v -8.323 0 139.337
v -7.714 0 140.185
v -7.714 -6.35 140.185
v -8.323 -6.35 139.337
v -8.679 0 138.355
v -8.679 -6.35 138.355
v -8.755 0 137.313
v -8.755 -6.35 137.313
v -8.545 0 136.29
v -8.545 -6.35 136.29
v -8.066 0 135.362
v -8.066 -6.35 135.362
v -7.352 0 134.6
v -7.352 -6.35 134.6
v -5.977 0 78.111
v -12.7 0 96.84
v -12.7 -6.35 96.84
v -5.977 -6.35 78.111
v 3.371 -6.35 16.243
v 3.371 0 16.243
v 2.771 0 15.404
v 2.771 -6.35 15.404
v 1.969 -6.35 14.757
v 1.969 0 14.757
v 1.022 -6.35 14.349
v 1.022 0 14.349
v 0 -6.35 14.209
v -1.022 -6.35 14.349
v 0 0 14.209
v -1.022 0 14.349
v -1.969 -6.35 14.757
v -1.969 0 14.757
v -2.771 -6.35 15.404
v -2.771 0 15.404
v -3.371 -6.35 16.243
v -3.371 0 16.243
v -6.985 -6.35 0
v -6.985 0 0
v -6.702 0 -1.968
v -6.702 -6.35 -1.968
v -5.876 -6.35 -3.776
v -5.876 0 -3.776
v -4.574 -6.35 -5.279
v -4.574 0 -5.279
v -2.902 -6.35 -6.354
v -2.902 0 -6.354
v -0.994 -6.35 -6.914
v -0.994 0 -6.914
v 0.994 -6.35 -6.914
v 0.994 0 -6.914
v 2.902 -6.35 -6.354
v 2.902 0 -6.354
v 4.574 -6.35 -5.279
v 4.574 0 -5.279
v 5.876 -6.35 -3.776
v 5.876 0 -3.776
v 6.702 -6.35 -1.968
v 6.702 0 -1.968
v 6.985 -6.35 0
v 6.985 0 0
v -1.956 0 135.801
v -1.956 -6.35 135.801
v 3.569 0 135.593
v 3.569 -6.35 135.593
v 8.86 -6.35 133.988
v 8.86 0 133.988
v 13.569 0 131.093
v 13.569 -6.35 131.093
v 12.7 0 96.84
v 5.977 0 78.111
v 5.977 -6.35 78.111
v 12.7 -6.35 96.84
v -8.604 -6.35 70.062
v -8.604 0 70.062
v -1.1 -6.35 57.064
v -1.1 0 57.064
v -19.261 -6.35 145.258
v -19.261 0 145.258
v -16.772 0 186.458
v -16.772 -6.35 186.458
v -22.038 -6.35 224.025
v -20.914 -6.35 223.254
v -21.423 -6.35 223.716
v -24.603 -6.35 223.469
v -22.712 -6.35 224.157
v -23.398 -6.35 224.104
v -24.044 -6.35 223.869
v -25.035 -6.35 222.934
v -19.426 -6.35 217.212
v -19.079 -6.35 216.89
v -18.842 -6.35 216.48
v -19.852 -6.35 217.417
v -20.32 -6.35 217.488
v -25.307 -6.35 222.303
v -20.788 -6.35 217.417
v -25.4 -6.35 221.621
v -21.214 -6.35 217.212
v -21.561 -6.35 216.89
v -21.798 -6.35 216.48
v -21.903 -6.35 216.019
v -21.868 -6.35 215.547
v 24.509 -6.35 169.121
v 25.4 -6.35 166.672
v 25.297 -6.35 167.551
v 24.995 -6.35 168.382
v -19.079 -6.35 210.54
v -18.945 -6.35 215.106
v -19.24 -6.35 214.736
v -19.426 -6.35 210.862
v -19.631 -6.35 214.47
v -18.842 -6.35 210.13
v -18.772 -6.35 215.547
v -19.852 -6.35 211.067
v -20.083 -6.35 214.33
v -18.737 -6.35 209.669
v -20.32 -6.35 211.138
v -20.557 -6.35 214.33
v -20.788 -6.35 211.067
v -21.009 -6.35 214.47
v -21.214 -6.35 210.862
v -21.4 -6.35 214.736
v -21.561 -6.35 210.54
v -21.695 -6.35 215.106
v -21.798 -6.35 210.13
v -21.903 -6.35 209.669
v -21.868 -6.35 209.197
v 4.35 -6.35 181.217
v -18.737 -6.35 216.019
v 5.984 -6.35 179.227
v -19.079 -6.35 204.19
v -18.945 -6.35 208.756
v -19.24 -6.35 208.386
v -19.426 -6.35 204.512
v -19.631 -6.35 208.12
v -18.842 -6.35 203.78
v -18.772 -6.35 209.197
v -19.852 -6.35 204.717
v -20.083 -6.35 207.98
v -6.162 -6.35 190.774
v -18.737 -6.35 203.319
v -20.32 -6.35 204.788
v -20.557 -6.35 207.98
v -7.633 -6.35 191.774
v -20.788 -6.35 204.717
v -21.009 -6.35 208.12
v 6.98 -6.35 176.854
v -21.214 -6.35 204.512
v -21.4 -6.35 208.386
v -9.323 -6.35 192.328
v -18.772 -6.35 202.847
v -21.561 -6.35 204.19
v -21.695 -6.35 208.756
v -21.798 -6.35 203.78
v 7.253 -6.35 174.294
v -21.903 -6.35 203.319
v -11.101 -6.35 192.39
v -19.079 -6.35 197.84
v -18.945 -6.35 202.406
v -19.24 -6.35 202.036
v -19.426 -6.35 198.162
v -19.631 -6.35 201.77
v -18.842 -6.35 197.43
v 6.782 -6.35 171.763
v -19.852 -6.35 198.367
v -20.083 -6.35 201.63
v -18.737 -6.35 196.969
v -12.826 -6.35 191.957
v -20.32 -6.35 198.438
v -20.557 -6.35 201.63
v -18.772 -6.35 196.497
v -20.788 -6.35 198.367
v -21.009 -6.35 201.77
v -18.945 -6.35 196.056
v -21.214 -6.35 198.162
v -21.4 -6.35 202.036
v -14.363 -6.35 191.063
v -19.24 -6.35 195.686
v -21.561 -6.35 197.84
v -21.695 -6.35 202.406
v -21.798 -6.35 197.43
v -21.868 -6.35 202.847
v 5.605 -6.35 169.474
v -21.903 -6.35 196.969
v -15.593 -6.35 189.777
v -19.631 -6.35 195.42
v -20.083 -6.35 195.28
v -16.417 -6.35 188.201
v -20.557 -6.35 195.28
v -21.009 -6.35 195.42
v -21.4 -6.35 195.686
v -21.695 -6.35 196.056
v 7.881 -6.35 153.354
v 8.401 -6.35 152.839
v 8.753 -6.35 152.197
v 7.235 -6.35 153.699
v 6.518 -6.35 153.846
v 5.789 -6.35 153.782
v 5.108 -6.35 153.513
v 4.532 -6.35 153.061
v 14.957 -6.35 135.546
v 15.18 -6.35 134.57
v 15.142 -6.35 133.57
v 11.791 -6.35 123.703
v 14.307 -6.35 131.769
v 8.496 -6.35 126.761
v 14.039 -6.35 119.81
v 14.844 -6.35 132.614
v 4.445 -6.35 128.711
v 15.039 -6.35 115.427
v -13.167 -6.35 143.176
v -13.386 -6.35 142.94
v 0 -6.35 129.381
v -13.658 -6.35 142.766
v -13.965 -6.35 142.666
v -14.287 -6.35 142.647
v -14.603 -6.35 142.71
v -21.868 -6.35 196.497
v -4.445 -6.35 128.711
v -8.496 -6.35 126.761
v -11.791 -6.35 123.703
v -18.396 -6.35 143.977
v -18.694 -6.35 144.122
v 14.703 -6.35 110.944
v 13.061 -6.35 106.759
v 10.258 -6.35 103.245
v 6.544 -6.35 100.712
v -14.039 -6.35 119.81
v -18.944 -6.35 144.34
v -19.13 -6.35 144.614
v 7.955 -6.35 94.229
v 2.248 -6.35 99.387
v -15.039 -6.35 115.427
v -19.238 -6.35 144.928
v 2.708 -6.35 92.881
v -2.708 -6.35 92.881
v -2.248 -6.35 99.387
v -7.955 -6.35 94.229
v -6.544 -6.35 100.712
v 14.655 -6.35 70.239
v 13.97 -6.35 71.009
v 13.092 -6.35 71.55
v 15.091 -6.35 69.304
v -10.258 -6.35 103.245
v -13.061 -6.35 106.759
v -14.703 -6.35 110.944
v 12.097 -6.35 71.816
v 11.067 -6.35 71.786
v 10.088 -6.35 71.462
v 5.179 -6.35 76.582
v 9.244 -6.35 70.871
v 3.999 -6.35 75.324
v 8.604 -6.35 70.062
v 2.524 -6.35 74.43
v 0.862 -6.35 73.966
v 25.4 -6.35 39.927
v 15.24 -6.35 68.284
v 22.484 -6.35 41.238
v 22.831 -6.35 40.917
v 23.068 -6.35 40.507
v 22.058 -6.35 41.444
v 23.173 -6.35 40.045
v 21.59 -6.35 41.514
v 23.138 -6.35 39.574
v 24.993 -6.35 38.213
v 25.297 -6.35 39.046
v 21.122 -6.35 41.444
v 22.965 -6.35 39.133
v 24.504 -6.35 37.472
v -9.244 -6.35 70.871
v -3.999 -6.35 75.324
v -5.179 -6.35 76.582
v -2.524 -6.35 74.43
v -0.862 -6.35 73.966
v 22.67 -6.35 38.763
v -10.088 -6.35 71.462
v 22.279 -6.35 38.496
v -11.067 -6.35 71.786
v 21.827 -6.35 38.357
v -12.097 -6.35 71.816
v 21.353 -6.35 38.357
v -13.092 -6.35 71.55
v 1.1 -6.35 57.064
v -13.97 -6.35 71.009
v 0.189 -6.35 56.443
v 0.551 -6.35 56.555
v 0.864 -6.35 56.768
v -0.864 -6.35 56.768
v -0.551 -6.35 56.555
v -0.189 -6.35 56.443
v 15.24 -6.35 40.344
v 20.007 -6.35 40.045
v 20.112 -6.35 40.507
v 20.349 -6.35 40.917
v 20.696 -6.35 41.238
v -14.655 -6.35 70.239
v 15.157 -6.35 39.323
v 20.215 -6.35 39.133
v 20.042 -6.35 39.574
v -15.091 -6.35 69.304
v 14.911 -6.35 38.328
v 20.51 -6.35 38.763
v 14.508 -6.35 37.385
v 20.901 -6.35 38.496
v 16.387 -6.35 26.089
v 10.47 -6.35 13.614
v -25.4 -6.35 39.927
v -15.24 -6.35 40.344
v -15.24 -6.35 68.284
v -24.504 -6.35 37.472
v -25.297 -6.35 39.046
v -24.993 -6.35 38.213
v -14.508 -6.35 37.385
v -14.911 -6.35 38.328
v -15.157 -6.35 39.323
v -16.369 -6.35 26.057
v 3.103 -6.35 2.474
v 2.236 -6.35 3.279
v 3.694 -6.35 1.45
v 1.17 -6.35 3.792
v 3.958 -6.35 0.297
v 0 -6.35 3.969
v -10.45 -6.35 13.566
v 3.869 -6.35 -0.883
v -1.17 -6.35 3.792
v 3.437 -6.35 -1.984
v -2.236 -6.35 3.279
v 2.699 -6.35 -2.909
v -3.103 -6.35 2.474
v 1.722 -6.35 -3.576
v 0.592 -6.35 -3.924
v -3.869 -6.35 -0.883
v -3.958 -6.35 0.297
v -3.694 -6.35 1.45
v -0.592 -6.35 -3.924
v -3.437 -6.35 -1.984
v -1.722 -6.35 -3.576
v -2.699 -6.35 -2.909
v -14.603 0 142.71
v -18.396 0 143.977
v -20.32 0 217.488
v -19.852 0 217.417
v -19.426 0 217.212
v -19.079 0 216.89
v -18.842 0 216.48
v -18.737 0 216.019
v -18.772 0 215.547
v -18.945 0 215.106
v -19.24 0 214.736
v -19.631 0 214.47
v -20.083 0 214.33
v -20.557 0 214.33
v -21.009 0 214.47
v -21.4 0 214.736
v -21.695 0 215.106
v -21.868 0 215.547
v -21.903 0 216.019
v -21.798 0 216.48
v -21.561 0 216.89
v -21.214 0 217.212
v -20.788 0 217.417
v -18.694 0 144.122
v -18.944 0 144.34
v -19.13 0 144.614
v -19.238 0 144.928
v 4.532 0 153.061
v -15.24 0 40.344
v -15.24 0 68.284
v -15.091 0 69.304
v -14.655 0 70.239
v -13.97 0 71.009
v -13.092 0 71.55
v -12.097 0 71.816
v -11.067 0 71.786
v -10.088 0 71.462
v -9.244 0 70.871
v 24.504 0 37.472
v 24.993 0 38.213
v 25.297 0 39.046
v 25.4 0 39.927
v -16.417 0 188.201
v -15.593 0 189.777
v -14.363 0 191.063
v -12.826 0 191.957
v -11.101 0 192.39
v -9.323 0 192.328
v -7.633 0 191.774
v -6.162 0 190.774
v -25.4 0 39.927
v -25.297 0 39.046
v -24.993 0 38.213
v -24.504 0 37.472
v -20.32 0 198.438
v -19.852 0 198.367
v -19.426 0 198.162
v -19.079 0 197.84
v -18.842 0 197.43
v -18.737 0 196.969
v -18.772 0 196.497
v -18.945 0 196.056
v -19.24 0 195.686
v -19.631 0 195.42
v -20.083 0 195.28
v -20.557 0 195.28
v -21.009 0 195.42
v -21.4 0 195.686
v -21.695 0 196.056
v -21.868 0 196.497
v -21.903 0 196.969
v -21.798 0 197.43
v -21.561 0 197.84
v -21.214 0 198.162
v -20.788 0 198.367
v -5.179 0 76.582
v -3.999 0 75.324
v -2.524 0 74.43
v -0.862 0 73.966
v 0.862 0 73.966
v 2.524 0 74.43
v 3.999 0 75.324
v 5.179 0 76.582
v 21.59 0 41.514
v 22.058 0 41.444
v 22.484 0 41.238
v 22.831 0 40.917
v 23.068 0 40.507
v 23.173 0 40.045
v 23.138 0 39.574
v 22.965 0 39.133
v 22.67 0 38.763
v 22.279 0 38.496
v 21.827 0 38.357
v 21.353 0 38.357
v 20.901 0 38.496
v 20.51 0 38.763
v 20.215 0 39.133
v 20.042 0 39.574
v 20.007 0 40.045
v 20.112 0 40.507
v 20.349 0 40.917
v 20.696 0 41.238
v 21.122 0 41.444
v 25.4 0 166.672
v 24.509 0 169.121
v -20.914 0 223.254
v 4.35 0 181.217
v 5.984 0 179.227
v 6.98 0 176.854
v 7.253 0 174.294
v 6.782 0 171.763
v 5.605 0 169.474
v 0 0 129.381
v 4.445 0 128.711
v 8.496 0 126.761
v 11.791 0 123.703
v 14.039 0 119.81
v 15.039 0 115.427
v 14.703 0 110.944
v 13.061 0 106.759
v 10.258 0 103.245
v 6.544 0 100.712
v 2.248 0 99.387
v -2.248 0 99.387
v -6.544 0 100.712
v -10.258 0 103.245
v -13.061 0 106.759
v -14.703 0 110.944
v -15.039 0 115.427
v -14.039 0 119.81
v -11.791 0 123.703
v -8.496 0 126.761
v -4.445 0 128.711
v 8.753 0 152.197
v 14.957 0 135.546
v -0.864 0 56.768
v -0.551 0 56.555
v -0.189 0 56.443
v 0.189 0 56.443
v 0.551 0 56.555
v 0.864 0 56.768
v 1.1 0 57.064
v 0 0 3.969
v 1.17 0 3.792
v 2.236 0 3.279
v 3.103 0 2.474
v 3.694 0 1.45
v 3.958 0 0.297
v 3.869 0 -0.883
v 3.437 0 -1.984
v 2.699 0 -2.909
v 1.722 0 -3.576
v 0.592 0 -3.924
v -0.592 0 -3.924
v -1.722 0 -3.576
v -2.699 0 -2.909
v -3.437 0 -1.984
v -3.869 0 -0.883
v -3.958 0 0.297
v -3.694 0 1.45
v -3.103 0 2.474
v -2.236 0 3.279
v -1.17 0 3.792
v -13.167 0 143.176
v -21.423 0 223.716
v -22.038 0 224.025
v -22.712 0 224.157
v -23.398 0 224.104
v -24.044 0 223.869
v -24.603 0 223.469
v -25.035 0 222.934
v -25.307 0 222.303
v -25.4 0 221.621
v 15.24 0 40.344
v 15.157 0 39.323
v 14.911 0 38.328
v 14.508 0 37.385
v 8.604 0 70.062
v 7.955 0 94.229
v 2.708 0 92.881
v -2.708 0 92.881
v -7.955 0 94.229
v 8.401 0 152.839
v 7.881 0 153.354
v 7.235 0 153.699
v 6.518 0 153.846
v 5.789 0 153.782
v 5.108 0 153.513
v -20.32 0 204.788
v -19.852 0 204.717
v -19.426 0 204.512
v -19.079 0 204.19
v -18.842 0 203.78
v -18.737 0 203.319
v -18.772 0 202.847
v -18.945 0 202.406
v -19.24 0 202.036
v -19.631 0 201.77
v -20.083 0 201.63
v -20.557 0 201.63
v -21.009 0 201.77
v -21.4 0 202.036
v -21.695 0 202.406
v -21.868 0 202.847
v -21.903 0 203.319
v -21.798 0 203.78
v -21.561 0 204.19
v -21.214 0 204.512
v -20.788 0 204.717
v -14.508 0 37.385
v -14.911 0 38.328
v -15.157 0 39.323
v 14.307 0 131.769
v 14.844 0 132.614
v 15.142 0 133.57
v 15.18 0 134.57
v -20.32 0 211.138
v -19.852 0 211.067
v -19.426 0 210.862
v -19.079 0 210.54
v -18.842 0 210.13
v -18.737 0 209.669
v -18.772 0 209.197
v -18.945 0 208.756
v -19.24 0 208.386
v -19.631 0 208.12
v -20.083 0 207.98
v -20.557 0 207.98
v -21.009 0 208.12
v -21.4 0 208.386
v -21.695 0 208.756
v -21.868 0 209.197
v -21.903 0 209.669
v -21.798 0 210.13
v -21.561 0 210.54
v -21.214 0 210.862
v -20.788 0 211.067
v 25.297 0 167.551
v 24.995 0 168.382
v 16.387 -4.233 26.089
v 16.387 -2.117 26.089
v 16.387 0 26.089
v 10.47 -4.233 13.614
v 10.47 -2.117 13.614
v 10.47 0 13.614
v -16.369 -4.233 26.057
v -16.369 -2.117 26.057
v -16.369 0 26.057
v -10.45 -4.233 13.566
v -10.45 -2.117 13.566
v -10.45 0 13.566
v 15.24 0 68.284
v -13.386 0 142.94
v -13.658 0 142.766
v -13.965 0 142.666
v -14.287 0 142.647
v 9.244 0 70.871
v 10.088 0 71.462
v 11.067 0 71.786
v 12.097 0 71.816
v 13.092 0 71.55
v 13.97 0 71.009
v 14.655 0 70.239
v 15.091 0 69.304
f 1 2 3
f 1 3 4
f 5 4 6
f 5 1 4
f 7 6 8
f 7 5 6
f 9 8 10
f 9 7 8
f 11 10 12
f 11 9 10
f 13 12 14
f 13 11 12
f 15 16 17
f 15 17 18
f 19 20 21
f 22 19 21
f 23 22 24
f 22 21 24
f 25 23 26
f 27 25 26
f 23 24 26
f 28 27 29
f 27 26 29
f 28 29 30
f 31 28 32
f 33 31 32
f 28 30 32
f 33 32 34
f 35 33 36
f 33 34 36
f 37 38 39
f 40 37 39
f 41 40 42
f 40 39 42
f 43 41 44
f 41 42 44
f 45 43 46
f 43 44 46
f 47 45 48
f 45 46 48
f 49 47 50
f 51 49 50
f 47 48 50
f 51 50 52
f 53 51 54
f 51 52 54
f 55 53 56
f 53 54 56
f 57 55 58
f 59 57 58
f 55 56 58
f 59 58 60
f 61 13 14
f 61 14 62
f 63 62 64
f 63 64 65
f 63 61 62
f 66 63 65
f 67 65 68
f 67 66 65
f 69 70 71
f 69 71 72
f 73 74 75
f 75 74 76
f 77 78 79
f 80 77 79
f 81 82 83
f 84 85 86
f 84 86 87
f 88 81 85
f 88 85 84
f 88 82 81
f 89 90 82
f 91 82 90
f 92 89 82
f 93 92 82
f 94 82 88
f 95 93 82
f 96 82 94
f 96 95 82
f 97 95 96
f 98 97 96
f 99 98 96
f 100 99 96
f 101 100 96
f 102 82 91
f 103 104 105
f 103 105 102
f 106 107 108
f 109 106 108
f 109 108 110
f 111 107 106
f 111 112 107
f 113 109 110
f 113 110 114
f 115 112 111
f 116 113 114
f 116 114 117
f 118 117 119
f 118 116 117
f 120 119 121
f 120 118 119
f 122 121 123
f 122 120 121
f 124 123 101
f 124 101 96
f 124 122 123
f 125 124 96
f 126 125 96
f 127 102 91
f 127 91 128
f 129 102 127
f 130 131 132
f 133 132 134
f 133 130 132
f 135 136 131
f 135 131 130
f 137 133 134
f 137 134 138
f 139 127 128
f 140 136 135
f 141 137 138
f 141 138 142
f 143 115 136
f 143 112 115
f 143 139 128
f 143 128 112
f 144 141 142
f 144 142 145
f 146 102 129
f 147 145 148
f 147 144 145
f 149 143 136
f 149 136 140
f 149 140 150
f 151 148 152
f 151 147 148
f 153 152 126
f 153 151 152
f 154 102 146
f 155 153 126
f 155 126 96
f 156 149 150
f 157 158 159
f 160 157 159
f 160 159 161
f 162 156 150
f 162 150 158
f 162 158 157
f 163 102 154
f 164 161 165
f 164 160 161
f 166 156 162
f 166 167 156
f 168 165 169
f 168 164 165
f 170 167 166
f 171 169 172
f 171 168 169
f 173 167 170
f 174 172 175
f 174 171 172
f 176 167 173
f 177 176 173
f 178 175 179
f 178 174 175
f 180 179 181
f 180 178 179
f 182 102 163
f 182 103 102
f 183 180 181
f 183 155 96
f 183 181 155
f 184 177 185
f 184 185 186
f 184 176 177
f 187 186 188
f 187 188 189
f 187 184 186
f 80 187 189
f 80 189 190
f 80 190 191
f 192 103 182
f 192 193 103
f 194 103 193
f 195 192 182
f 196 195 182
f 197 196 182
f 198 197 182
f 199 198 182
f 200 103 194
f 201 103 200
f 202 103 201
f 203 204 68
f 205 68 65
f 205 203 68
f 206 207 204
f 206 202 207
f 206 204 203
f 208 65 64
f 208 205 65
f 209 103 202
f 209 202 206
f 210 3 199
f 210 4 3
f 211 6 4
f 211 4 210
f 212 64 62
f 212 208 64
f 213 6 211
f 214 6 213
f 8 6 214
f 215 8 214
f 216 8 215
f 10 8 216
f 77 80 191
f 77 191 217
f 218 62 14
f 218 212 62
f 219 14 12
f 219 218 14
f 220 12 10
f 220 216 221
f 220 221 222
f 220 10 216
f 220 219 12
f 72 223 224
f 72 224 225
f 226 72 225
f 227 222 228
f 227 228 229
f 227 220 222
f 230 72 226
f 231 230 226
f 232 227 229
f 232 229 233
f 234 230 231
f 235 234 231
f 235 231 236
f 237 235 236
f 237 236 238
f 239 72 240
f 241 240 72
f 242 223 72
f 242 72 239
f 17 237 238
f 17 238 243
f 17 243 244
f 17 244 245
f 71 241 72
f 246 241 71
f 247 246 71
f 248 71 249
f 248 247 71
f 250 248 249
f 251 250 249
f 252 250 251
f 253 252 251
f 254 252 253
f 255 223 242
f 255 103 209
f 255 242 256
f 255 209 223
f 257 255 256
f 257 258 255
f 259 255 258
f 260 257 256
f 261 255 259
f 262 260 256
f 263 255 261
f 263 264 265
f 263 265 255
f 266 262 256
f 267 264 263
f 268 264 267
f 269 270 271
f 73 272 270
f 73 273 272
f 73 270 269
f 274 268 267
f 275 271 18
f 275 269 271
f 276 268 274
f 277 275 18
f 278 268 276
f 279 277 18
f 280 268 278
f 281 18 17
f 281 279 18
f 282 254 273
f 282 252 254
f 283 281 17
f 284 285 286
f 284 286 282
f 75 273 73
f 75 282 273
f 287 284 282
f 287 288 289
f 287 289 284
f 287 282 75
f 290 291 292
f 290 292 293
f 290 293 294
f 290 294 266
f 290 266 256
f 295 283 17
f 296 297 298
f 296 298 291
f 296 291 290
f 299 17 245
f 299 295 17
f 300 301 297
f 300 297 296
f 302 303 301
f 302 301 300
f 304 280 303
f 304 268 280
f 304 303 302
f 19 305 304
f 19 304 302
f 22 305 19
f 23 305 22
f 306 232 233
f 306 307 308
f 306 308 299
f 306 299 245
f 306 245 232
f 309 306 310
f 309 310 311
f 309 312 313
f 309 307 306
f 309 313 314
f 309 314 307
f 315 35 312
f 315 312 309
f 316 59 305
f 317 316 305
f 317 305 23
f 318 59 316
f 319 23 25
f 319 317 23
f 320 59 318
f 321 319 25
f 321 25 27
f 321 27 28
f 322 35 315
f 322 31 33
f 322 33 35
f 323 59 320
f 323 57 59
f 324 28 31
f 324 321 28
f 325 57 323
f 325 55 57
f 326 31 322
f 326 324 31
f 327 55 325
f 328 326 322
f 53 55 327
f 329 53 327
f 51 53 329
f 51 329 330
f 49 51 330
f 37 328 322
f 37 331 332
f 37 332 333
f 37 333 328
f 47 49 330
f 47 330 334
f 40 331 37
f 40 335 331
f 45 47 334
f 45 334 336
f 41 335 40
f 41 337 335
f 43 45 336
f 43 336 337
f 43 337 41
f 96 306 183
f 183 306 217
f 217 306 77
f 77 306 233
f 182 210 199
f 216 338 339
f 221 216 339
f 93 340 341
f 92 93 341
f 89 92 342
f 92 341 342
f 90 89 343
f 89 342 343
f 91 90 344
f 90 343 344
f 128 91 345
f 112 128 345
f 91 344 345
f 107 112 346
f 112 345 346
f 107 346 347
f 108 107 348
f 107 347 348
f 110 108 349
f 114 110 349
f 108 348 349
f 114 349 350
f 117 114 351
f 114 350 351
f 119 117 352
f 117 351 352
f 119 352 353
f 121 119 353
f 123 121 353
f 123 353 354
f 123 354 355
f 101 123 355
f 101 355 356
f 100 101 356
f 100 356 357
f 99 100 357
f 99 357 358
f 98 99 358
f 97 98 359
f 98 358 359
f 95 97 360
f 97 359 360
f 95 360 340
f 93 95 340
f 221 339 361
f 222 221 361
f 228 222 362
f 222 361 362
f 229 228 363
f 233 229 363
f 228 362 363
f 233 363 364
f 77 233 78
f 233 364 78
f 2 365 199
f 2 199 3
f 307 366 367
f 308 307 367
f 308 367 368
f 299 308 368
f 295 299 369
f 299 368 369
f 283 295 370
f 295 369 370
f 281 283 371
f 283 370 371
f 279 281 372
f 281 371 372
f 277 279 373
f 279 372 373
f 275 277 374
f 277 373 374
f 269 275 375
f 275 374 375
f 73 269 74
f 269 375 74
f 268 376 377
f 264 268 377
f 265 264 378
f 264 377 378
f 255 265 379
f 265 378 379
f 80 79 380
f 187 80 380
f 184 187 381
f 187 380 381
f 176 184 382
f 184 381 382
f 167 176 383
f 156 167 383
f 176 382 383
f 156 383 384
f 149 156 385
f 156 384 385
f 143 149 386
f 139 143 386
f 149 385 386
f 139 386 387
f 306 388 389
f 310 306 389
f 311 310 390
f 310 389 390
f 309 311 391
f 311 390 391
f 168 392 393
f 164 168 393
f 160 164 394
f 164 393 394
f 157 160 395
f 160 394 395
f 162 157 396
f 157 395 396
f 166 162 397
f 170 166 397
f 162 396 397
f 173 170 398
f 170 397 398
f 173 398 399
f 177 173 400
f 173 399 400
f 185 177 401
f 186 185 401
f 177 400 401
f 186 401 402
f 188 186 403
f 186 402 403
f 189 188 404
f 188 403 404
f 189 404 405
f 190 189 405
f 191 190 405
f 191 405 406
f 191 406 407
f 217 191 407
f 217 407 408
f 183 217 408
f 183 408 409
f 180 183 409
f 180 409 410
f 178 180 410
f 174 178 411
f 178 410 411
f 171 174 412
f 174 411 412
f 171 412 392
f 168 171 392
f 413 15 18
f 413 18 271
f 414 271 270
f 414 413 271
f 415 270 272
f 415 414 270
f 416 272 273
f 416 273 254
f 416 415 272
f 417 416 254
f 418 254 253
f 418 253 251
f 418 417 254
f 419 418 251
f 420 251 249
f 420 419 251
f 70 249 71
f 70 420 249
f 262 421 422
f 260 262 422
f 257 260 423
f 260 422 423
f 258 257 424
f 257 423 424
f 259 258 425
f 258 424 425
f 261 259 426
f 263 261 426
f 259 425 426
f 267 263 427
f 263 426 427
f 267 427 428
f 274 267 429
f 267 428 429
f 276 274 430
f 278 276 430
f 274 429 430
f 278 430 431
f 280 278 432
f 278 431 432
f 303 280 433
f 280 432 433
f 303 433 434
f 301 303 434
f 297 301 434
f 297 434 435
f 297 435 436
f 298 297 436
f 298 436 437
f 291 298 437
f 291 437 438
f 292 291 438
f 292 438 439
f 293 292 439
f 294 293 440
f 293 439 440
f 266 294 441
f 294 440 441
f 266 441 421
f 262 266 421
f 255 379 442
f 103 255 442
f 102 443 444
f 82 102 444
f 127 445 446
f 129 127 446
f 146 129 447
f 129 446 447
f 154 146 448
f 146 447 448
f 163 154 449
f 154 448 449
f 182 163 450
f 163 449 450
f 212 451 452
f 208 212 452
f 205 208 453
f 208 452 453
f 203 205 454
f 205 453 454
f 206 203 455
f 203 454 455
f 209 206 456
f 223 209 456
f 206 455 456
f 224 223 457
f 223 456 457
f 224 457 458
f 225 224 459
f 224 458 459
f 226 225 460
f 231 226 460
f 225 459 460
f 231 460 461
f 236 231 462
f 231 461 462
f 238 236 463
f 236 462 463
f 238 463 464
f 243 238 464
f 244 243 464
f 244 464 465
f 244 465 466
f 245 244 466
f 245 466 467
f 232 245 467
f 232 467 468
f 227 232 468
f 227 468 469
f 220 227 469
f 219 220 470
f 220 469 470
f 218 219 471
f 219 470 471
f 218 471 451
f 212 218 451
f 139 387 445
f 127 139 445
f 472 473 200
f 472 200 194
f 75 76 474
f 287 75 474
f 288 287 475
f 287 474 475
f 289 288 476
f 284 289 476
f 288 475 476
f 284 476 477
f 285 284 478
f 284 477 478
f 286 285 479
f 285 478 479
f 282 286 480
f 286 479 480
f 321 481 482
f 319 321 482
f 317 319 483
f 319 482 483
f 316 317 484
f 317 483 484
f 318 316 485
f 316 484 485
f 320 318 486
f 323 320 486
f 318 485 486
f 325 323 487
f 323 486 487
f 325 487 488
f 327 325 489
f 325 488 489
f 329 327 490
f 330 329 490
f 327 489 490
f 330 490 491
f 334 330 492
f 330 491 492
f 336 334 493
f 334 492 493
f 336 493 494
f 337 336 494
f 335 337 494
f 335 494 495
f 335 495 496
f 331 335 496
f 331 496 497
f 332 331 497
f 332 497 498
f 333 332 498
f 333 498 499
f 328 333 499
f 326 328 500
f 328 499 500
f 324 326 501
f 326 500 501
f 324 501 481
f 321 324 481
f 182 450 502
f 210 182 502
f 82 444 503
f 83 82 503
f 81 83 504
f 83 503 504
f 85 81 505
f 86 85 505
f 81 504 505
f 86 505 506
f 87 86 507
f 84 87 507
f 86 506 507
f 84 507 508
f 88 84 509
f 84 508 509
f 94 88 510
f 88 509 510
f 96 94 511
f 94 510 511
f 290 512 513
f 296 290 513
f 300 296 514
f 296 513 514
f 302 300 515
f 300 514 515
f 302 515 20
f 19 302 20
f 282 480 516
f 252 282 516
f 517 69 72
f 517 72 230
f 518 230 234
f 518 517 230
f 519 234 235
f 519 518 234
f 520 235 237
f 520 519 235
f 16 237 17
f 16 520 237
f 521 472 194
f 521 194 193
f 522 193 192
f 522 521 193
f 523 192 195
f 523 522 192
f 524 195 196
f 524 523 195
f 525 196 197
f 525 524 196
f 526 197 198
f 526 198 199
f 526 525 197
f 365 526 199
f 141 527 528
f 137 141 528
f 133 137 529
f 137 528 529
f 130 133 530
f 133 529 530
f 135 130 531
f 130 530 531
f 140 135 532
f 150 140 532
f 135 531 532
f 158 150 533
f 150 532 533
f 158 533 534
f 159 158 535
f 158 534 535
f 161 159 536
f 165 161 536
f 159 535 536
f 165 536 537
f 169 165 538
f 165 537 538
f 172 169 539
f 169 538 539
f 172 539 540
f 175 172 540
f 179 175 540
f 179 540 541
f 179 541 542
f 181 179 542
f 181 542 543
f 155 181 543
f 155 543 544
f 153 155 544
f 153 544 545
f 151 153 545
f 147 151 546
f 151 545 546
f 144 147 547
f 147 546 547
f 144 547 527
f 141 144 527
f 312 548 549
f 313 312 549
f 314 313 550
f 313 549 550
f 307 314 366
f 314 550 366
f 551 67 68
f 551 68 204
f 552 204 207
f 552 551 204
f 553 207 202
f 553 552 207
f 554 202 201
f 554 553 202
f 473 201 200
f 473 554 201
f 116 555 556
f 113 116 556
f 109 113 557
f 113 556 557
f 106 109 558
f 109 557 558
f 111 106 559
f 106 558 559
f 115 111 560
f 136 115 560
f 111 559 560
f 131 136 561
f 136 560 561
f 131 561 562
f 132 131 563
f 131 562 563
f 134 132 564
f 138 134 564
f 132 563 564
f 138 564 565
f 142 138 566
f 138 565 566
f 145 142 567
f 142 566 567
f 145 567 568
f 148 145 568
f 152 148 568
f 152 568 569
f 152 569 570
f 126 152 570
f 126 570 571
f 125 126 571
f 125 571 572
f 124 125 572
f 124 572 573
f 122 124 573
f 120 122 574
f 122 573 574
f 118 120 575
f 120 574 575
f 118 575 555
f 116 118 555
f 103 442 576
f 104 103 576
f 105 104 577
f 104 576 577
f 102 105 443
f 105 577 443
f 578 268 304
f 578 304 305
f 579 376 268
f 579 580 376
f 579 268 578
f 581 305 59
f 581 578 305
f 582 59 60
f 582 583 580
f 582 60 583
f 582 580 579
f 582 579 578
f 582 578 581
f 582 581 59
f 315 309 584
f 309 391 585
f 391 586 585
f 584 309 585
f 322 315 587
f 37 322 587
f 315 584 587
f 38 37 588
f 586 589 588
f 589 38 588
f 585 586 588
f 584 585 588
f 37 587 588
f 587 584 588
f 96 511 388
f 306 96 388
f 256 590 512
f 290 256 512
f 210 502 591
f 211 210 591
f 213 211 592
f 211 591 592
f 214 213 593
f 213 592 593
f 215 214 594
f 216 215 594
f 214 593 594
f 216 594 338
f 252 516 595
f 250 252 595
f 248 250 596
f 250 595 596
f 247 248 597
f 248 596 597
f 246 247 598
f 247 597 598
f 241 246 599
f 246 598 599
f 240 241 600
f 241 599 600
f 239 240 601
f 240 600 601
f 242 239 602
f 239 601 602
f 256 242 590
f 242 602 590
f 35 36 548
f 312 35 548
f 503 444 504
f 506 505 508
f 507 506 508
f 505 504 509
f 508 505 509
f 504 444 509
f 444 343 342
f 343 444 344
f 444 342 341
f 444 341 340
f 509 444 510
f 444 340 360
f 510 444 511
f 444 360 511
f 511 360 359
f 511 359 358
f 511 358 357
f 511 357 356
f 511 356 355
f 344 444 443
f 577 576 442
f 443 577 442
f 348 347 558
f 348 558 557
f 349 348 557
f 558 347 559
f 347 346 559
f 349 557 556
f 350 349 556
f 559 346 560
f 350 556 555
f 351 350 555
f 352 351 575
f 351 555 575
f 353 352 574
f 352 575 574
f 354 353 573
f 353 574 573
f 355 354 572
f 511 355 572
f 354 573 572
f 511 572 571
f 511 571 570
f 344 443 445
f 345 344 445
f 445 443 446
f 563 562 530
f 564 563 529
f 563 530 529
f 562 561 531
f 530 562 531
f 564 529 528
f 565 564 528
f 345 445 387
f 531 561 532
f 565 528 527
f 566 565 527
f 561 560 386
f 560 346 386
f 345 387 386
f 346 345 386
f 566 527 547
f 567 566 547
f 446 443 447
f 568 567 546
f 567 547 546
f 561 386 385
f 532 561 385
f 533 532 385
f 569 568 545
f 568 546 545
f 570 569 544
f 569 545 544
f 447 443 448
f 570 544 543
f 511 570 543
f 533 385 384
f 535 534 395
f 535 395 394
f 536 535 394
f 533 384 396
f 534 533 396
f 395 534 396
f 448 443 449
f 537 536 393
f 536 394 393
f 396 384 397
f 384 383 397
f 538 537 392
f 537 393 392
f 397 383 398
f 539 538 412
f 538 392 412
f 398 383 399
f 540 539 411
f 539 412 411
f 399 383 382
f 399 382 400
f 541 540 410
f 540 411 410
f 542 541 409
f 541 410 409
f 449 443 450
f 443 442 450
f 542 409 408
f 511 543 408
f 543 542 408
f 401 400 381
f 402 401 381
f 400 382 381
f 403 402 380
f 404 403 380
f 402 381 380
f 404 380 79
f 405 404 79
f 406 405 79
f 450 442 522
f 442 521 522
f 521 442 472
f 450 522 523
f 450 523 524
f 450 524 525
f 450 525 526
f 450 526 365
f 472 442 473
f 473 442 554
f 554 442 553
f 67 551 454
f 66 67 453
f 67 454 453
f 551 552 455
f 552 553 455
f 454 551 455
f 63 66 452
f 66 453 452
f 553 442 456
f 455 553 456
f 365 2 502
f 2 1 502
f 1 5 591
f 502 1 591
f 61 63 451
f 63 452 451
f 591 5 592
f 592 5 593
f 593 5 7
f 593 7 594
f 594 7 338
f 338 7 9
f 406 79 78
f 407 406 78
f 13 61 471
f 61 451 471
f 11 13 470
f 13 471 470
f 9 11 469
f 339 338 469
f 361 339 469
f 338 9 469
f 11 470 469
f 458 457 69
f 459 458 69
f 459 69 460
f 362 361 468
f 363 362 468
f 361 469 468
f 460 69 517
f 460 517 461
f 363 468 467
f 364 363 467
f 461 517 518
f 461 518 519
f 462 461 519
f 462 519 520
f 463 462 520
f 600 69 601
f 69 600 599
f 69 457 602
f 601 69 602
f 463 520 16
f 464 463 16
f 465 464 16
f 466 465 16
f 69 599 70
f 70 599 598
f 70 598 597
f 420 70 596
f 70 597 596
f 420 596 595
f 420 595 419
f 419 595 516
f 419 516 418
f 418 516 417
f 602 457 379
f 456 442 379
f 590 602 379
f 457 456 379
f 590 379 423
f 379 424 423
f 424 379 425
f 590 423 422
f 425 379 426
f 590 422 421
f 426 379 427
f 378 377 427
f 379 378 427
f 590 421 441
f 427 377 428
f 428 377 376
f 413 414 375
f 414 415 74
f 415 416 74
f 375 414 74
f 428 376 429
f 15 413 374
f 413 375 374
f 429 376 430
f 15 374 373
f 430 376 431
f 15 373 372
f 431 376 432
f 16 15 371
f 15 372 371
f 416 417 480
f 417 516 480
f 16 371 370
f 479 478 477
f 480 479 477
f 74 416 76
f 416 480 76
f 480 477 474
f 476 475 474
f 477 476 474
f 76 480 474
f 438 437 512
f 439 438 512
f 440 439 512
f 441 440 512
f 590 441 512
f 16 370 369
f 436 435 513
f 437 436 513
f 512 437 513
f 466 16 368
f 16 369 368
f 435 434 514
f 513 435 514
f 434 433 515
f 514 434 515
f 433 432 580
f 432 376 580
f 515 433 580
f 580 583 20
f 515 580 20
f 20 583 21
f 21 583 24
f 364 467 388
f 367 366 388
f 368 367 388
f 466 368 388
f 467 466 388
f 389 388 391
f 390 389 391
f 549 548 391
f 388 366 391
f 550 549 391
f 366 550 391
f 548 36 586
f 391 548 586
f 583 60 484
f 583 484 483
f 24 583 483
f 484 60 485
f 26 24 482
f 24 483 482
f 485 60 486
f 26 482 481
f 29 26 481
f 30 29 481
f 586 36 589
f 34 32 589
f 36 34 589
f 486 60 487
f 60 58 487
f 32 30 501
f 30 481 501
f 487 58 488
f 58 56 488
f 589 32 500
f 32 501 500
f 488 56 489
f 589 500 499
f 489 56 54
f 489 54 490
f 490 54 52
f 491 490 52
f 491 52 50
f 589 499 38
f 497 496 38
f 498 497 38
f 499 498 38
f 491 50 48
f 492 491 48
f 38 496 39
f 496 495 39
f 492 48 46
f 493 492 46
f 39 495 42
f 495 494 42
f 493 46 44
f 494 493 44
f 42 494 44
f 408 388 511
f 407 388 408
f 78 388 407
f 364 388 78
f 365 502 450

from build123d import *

# Parameters (mm, degrees)
SKETCH1_R           = 3.96875
SKETCH1_R_2         = 15.08125
SKETCH1_R_3         = 1.5875
BOSS_EXTRUDE1_DEPTH = 6.35


with BuildPart() as part:
    # Sketch1 → Boss-Extrude1 (new body)
    with BuildSketch(Plane(origin=(0, 0, 0), x_dir=(1, 0, 0), z_dir=(0, 1, 0))):
        with BuildLine():
            Line((25.4, -39.926769414), (25.4, -166.672190904))
            ThreePointArc((25.4, -166.672190904), (25.170228885, -167.97528765), (24.508629328, -169.121211697))
            Line((24.508629328, -169.121211697), (-20.914247114, -223.254087883))
            ThreePointArc((-20.914247114, -223.254087883), (-23.728731164, -224.008226611), (-25.4, -221.621407355))
            Line((-25.4, -221.621407355), (-25.4, -39.926769414))
            ThreePointArc((-25.4, -39.926769414), (-25.169027772, -38.620377357), (-24.504115377, -37.472379149))
            add(Edge.make_bspline(
                [(-24.504115377, -37.472379149), (-15.341464403, -26.593497135), (-9.143369894, -14.104472305), (-6.985, 0)],
                knots=[0.031078099, 0.031078099, 0.031078099, 0.031078099, 1, 1, 1, 1], degree=3))
            ThreePointArc((-6.985, 0), (0, 6.985), (6.985, 0))
            add(Edge.make_bspline(
                [(24.504115377, -37.472379149), (15.363034866, -26.619107902), (9.178211427, -14.199965817), (6.985, 0)],
                knots=[0.031766068, 0.031766068, 0.031766068, 0.031766068, 1, 1, 1, 1], degree=3))
            ThreePointArc((24.504115377, -37.472379149), (25.169027772, -38.620377357), (25.4, -39.926769414))
        make_face()
        with Locations(Location((0, 0, 0), (0, 0, 270))):
            Circle(SKETCH1_R, mode=Mode.SUBTRACT)
        with Locations(Location((0, -114.3, 0), (0, 0, 270))):
            Circle(SKETCH1_R_2, mode=Mode.SUBTRACT)
        with Locations(Location((-20.32, -215.9, 0), (0, 0, 270))):
            Circle(SKETCH1_R_3, mode=Mode.SUBTRACT)
        with Locations(Location((-20.32, -209.55, 0), (0, 0, 270))):
            Circle(SKETCH1_R_3, mode=Mode.SUBTRACT)
        with Locations(Location((-20.32, -203.2, 0), (0, 0, 270))):
            Circle(SKETCH1_R_3, mode=Mode.SUBTRACT)
        with Locations(Location((-20.32, -196.85, 0), (0, 0, 270))):
            Circle(SKETCH1_R_3, mode=Mode.SUBTRACT)
        with Locations(Location((21.59, -39.926769414, 0), (0, 0, 270))):
            Circle(SKETCH1_R_3, mode=Mode.SUBTRACT)
        with BuildLine():
            Line((5.605496622, -169.473670788), (-13.166879596, -143.176324304))
            ThreePointArc((-13.166879596, -143.176324304), (-13.808086261, -142.706355865), (-14.603073846, -142.709681833))
            Line((-14.603073846, -142.709681833), (-18.395861473, -143.977201329))
            ThreePointArc((-18.395861473, -143.977201329), (-19.045805463, -144.470960171), (-19.26101006, -145.258305054))
            Line((-19.26101006, -145.258305054), (-16.771936742, -186.45833168))
            ThreePointArc((-16.771936742, -186.45833168), (-12.825939472, -191.957464848), (-6.161826947, -190.773841461))
            Line((-6.161826947, -190.773841461), (4.350250475, -181.216613261))
            ThreePointArc((4.350250475, -181.216613261), (7.209558699, -175.583695027), (5.605496622, -169.473670788))
        make_face(mode=Mode.SUBTRACT)
        with BuildLine():
            Line((4.532066161, -153.060524084), (-7.713720706, -140.184809241))
            ThreePointArc((-7.713720706, -140.184809241), (-8.755006703, -137.313107924), (-7.352336236, -134.599538218))
            ThreePointArc((-7.352336236, -134.599538218), (3.568908967, -135.592979801), (13.569379689, -131.092856661))
            ThreePointArc((13.569379689, -131.092856661), (15.024402409, -133.082319121), (14.957124713, -135.546162806))
            Line((14.957124713, -135.546162806), (8.752708503, -152.196945016))
            ThreePointArc((8.752708503, -152.196945016), (6.881732179, -153.798504677), (4.532066161, -153.060524084))
        make_face(mode=Mode.SUBTRACT)
        with BuildLine():
            Line((-12.7, -96.840386602), (-5.976567434, -78.111338504))
            ThreePointArc((-5.976567434, -78.111338504), (0, -73.906831852), (5.976567434, -78.111338504))
            Line((5.976567434, -78.111338504), (12.7, -96.840386602))
            ThreePointArc((12.7, -96.840386602), (0, -92.71), (-12.7, -96.840386602))
        make_face(mode=Mode.SUBTRACT)
        with BuildLine():
            Line((-3.370875395, -16.243299574), (-14.508125658, -37.384911468))
            ThreePointArc((-14.508125658, -37.384911468), (-15.054316585, -38.820130907), (-15.24, -40.344499969))
            Line((-15.24, -40.344499969), (-15.24, -68.284499969))
            ThreePointArc((-15.24, -68.284499969), (-12.604360524, -71.719332208), (-8.604413664, -70.062499969))
            Line((-8.604413664, -70.062499969), (-1.099852263, -57.064218334))
            ThreePointArc((-1.099852263, -57.064218334), (0, -56.429218334), (1.099852263, -57.064218334))
            Line((1.099852263, -57.064218334), (8.604413664, -70.062499969))
            ThreePointArc((8.604413664, -70.062499969), (12.604360524, -71.719332208), (15.24, -68.284499969))
            Line((15.24, -68.284499969), (15.24, -40.344499969))
            ThreePointArc((15.24, -40.344499969), (15.054316585, -38.820130907), (14.508125658, -37.384911468))
            Line((14.508125658, -37.384911468), (3.370875395, -16.243299574))
            ThreePointArc((3.370875395, -16.243299574), (0, -14.209052675), (-3.370875395, -16.243299574))
        make_face(mode=Mode.SUBTRACT)
    extrude(amount=-BOSS_EXTRUDE1_DEPTH)


solid = part.part
